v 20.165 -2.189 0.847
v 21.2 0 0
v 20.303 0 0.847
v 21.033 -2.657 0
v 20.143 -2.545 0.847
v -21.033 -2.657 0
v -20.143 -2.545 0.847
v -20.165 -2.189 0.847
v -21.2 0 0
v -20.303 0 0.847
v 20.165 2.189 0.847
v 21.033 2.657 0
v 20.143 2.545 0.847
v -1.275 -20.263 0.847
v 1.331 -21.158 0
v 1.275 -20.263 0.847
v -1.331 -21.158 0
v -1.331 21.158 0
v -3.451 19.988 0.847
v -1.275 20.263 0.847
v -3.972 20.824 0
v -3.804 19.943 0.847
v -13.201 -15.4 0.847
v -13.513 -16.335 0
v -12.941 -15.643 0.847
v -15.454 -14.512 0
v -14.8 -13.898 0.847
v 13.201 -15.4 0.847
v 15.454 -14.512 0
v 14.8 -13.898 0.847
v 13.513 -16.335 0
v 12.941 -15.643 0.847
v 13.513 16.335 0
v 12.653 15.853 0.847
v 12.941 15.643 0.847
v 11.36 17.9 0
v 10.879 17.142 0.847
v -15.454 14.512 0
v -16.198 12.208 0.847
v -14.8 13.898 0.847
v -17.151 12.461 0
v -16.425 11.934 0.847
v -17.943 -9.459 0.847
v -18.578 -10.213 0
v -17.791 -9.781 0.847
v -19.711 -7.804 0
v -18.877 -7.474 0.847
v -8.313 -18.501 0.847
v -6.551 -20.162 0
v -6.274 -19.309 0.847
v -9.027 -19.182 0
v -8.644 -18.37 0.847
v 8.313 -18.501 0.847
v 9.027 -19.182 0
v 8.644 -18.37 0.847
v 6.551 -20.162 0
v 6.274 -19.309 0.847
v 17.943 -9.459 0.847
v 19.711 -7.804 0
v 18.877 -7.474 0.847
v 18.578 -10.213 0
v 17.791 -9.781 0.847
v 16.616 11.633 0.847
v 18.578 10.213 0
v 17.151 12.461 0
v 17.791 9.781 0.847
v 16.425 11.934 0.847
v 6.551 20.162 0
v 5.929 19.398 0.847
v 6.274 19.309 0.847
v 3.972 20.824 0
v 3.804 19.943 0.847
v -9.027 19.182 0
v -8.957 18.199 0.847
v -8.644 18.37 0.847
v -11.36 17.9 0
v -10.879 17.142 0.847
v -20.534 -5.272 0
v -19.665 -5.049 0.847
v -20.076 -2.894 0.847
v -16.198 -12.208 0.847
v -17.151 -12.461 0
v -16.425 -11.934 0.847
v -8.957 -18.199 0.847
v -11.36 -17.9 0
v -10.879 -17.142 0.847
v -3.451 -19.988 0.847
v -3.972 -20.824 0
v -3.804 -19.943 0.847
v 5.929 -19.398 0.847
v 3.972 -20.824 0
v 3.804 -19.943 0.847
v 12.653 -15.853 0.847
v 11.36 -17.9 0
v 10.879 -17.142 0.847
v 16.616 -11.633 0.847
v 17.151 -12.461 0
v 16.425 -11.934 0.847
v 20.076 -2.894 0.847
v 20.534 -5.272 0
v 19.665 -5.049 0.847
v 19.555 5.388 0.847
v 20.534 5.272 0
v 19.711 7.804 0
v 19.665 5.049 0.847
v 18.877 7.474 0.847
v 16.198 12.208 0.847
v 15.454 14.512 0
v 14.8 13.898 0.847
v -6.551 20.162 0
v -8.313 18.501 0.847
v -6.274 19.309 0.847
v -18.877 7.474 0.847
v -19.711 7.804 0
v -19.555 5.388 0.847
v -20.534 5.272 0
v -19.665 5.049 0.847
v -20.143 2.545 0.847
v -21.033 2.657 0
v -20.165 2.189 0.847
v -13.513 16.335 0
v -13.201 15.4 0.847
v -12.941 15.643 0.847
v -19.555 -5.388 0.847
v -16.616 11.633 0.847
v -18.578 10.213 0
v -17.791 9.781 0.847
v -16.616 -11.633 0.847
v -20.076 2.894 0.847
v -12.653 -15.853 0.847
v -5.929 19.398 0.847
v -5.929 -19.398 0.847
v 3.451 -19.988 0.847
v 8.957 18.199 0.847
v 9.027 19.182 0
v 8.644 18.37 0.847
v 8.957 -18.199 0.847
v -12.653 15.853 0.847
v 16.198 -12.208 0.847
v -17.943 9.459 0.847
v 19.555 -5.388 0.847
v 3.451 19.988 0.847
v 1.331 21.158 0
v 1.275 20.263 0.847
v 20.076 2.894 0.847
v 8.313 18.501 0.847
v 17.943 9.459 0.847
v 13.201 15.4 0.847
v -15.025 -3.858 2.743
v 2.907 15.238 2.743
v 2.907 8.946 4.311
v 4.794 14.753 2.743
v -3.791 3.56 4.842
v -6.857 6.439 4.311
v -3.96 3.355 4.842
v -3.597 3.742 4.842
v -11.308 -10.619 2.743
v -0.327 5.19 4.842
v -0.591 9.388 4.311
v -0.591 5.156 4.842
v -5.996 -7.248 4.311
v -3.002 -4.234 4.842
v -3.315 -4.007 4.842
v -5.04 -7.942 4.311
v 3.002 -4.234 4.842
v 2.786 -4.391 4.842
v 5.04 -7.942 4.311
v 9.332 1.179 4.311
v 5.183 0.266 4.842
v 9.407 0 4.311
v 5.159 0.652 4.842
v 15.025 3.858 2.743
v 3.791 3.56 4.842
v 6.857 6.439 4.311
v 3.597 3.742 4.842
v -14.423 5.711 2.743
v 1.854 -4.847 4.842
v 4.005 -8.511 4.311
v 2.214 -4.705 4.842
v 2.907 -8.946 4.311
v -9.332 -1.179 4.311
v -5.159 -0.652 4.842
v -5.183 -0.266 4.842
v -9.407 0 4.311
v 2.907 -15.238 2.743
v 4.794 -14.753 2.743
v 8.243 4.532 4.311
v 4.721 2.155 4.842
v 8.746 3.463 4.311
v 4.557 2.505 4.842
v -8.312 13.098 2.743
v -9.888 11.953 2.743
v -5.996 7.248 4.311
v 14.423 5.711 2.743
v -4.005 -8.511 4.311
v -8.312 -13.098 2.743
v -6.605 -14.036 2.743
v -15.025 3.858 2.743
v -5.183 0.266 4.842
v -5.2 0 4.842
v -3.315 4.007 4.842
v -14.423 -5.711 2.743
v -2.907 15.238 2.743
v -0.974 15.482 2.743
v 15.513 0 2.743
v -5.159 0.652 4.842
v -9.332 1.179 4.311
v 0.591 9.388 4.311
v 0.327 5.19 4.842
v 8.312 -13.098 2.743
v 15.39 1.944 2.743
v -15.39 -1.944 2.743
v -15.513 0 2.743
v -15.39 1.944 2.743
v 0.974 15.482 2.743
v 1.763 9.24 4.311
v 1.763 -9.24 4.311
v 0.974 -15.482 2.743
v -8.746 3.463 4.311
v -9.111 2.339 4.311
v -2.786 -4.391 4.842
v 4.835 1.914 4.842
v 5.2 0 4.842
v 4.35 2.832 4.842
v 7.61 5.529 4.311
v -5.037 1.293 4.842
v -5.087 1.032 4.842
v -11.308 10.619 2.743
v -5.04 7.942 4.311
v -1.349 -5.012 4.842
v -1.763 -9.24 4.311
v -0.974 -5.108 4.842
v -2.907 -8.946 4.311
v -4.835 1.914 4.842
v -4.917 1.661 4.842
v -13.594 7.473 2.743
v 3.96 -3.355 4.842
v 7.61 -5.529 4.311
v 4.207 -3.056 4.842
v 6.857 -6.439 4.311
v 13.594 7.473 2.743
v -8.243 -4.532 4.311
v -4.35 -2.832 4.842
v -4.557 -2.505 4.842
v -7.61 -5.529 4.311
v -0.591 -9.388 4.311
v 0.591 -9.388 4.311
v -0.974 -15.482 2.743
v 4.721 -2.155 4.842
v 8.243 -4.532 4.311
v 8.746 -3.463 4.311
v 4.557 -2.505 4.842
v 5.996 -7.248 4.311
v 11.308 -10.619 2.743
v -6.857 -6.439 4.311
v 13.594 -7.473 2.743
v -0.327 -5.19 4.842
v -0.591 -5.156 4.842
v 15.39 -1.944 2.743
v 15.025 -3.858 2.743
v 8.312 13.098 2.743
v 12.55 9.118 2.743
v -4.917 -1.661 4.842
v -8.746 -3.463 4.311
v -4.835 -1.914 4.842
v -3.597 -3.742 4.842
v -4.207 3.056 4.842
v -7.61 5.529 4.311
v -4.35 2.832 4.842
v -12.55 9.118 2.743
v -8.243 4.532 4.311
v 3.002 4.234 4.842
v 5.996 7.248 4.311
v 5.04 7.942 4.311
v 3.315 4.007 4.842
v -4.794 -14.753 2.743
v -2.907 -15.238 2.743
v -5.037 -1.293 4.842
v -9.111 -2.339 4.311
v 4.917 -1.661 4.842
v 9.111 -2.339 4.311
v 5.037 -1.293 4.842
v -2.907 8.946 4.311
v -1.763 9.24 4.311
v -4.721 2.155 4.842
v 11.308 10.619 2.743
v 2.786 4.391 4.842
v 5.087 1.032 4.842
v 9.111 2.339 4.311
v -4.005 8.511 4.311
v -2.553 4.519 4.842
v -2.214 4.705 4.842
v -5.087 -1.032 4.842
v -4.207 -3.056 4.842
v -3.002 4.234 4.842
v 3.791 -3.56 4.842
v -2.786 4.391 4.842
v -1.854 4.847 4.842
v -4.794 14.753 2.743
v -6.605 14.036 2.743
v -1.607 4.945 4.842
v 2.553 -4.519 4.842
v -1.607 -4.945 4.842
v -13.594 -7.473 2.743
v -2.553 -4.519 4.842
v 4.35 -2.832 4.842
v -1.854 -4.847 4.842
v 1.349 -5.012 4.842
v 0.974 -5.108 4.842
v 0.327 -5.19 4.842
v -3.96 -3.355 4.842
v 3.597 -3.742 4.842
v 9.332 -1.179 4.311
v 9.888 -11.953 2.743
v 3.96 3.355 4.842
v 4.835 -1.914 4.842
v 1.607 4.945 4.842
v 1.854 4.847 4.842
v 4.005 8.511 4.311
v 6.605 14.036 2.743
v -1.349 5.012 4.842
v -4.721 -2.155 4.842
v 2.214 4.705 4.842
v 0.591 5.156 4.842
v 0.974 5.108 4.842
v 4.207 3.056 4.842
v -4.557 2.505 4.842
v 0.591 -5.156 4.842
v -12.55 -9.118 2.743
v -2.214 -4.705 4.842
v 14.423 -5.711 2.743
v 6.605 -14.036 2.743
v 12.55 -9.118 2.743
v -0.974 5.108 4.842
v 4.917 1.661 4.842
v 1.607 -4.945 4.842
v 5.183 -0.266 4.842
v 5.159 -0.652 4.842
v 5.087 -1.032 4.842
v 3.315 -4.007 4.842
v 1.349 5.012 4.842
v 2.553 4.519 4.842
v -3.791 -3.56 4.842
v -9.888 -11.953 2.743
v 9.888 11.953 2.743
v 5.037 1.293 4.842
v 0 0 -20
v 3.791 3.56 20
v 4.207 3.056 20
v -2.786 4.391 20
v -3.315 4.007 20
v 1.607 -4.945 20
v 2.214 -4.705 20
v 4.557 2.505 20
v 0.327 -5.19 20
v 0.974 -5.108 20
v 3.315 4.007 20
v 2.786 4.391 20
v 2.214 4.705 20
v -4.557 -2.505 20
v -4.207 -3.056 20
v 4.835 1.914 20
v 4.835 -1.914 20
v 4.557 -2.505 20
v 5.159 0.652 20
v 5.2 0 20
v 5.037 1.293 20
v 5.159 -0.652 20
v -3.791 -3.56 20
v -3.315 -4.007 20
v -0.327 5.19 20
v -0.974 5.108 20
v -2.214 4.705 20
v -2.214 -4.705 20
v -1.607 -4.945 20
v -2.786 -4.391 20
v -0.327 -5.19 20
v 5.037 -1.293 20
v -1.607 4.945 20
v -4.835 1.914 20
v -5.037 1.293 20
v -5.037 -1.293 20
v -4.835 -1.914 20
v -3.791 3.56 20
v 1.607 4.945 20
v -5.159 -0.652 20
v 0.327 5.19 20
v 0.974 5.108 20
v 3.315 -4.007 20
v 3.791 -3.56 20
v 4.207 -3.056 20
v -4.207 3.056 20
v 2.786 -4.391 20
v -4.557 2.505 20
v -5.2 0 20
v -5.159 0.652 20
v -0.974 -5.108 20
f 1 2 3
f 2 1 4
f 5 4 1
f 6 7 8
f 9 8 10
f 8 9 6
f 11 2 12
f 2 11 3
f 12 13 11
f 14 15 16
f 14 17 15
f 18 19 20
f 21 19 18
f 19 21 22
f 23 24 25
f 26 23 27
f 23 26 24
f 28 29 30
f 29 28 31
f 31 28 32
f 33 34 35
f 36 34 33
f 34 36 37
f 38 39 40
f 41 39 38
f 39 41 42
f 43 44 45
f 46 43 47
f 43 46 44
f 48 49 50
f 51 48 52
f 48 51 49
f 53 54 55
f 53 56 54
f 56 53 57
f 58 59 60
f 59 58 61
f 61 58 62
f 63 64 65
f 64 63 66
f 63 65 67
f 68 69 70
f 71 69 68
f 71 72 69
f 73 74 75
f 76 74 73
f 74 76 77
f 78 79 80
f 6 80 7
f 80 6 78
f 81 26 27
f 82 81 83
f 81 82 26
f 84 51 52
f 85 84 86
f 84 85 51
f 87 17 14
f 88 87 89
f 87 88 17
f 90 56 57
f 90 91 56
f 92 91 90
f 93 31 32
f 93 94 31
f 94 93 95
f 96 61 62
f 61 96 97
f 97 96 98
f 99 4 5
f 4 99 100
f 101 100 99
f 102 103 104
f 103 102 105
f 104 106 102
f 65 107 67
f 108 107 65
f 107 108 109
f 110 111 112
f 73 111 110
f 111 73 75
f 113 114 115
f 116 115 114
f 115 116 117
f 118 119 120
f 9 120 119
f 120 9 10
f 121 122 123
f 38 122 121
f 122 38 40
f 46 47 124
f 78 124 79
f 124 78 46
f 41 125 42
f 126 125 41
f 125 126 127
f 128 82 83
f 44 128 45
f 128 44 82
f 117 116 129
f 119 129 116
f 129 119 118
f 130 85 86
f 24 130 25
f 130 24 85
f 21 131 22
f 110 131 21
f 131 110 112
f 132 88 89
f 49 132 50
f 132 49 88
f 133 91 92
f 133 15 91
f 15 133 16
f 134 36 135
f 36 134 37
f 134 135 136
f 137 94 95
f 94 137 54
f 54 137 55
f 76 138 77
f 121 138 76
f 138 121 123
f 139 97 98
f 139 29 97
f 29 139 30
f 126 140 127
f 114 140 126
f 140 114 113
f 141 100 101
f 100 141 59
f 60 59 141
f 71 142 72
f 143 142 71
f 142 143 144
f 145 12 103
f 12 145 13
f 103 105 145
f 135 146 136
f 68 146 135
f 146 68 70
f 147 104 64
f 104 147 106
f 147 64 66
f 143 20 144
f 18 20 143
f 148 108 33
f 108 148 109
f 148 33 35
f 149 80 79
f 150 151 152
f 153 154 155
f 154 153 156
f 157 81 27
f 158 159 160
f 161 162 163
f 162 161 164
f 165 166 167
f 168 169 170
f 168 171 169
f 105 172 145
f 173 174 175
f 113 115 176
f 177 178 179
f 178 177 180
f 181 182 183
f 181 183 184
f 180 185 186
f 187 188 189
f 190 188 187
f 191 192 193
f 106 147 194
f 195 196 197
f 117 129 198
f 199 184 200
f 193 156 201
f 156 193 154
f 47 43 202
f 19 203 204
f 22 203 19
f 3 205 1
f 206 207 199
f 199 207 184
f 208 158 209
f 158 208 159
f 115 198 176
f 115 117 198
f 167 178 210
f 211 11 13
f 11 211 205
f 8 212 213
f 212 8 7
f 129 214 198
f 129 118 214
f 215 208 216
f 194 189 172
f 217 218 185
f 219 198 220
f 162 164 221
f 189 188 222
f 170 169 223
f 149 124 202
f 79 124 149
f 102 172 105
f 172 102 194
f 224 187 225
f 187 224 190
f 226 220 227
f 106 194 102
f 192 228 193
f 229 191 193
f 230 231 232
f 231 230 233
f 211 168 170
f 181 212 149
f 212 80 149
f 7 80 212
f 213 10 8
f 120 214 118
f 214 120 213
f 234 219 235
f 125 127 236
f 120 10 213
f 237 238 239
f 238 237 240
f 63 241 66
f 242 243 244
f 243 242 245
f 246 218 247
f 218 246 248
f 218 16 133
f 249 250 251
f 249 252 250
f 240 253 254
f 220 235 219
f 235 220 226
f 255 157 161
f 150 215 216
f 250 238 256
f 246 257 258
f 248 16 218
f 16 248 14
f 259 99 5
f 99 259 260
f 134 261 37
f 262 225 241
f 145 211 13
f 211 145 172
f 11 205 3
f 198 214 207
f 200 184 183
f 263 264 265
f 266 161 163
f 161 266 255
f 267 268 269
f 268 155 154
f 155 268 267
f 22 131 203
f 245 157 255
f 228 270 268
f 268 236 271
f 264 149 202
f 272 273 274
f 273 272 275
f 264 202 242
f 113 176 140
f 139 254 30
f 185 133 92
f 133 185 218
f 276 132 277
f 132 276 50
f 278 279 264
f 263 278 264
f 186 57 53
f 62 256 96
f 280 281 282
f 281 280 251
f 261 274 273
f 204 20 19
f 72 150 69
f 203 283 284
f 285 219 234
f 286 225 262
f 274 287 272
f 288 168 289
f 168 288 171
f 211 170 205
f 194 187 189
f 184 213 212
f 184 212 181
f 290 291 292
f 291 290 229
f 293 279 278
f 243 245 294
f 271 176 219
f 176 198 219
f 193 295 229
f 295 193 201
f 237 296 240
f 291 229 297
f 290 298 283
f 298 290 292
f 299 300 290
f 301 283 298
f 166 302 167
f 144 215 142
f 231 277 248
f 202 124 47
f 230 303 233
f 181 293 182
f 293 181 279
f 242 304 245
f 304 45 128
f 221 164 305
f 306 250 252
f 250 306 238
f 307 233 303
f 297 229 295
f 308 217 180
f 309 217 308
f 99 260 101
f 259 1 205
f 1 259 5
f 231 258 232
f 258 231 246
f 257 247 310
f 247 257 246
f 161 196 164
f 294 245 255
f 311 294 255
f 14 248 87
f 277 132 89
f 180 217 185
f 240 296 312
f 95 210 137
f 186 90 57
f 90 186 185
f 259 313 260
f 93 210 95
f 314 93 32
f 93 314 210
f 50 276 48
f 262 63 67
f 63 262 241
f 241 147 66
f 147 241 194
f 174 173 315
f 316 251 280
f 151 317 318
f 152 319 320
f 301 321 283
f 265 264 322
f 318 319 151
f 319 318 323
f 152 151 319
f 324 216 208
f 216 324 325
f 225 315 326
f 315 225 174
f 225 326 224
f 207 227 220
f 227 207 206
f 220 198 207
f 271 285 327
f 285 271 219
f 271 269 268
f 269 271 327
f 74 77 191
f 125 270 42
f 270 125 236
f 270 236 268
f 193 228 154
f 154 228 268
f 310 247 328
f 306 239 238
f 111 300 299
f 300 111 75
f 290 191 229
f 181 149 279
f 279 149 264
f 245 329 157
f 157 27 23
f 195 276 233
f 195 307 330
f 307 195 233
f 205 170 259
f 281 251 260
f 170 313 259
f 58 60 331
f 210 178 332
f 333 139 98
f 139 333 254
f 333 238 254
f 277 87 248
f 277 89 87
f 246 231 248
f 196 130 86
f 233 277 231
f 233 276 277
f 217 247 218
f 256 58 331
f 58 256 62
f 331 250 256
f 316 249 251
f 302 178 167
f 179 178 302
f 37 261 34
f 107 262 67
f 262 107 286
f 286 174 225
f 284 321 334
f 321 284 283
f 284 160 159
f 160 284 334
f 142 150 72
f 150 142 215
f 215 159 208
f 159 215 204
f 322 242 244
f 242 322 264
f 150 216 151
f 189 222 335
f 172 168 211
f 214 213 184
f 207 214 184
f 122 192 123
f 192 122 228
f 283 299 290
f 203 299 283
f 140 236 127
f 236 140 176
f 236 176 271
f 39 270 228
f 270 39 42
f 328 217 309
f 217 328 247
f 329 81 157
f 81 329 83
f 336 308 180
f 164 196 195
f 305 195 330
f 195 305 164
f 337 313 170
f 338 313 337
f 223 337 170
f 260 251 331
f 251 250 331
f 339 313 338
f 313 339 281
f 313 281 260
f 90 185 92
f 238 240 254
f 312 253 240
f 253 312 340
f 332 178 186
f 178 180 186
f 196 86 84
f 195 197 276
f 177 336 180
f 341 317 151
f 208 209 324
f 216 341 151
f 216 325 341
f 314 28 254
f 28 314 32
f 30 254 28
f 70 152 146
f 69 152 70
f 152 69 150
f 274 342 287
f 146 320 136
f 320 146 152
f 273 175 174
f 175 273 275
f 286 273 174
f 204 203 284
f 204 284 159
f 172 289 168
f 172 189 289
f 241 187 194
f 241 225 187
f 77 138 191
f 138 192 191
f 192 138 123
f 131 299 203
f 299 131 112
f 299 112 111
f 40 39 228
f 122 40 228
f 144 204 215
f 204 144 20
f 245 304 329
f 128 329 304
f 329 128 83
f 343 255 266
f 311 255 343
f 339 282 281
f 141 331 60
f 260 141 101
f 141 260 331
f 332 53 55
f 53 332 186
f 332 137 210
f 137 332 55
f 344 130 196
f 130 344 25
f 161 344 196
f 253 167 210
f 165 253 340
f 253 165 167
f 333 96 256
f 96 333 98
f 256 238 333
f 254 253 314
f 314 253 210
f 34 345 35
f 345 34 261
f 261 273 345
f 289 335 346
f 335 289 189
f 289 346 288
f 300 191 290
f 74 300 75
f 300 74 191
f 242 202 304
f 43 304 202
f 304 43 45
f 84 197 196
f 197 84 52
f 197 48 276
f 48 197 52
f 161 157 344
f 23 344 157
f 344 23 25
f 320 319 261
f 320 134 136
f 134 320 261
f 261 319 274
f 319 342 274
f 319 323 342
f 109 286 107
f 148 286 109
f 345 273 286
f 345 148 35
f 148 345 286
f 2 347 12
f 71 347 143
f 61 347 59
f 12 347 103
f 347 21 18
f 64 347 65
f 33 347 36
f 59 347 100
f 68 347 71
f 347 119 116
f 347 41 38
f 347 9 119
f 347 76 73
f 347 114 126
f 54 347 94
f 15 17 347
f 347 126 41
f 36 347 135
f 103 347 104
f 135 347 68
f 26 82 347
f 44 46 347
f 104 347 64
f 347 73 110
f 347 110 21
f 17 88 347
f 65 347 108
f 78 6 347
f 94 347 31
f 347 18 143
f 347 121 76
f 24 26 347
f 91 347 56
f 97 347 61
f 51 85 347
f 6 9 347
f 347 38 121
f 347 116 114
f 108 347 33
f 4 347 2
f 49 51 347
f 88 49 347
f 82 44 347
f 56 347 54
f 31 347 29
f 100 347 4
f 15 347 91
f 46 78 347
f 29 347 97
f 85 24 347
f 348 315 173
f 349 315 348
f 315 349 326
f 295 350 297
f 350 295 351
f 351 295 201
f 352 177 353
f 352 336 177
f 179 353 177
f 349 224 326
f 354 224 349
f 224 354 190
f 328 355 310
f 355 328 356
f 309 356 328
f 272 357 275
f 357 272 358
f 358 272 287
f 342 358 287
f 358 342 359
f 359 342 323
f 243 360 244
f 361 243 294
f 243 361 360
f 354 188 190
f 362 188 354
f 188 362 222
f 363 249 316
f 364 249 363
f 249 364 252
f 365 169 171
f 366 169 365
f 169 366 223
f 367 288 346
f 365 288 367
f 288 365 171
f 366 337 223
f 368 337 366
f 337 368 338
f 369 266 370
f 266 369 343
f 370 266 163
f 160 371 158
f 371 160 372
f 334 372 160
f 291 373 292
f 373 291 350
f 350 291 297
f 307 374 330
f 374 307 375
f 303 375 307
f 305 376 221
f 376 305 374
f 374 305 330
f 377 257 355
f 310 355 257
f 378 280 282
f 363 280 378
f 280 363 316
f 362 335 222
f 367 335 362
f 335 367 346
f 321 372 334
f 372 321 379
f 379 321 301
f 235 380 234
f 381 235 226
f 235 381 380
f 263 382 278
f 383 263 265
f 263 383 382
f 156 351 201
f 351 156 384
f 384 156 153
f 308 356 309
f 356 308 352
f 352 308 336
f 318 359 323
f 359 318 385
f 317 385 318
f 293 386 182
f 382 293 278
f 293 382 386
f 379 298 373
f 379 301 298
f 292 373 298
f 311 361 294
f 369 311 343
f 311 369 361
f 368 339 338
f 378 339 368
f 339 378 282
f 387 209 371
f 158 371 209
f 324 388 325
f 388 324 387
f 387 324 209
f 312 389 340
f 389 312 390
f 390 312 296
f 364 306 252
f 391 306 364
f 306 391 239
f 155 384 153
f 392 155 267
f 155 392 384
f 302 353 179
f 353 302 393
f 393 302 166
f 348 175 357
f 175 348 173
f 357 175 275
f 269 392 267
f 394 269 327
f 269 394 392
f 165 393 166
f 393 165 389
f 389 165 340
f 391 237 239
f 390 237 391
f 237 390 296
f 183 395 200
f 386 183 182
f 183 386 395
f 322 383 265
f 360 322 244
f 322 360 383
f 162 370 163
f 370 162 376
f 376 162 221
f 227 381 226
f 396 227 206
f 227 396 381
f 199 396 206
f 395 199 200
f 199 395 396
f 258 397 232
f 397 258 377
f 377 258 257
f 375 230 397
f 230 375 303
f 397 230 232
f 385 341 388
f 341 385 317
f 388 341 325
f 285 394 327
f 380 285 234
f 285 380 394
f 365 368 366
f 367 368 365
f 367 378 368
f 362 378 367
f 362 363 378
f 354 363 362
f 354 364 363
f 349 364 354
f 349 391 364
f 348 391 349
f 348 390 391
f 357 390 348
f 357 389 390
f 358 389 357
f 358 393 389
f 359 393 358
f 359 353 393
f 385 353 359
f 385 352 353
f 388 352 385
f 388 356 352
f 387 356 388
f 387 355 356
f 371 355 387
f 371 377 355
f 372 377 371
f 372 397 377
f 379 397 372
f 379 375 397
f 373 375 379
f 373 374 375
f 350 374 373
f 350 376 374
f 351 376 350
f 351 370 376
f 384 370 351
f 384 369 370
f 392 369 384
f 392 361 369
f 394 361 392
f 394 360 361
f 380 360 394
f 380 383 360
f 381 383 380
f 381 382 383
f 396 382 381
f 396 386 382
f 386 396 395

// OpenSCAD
$fn=50;
color("yellow") translate([0,0,-20]) cylinder(h=20, r1=0, r2=21.2);
color("green") cylinder(h=20, r=5.2);
intersection(){
color("green") rotate([-180,0,0]) translate([0,0,-20])cylinder(h=20, r1=0, r2=21.2);
color("red")translate([0,0,-45]) sphere(r=50.2);
}
